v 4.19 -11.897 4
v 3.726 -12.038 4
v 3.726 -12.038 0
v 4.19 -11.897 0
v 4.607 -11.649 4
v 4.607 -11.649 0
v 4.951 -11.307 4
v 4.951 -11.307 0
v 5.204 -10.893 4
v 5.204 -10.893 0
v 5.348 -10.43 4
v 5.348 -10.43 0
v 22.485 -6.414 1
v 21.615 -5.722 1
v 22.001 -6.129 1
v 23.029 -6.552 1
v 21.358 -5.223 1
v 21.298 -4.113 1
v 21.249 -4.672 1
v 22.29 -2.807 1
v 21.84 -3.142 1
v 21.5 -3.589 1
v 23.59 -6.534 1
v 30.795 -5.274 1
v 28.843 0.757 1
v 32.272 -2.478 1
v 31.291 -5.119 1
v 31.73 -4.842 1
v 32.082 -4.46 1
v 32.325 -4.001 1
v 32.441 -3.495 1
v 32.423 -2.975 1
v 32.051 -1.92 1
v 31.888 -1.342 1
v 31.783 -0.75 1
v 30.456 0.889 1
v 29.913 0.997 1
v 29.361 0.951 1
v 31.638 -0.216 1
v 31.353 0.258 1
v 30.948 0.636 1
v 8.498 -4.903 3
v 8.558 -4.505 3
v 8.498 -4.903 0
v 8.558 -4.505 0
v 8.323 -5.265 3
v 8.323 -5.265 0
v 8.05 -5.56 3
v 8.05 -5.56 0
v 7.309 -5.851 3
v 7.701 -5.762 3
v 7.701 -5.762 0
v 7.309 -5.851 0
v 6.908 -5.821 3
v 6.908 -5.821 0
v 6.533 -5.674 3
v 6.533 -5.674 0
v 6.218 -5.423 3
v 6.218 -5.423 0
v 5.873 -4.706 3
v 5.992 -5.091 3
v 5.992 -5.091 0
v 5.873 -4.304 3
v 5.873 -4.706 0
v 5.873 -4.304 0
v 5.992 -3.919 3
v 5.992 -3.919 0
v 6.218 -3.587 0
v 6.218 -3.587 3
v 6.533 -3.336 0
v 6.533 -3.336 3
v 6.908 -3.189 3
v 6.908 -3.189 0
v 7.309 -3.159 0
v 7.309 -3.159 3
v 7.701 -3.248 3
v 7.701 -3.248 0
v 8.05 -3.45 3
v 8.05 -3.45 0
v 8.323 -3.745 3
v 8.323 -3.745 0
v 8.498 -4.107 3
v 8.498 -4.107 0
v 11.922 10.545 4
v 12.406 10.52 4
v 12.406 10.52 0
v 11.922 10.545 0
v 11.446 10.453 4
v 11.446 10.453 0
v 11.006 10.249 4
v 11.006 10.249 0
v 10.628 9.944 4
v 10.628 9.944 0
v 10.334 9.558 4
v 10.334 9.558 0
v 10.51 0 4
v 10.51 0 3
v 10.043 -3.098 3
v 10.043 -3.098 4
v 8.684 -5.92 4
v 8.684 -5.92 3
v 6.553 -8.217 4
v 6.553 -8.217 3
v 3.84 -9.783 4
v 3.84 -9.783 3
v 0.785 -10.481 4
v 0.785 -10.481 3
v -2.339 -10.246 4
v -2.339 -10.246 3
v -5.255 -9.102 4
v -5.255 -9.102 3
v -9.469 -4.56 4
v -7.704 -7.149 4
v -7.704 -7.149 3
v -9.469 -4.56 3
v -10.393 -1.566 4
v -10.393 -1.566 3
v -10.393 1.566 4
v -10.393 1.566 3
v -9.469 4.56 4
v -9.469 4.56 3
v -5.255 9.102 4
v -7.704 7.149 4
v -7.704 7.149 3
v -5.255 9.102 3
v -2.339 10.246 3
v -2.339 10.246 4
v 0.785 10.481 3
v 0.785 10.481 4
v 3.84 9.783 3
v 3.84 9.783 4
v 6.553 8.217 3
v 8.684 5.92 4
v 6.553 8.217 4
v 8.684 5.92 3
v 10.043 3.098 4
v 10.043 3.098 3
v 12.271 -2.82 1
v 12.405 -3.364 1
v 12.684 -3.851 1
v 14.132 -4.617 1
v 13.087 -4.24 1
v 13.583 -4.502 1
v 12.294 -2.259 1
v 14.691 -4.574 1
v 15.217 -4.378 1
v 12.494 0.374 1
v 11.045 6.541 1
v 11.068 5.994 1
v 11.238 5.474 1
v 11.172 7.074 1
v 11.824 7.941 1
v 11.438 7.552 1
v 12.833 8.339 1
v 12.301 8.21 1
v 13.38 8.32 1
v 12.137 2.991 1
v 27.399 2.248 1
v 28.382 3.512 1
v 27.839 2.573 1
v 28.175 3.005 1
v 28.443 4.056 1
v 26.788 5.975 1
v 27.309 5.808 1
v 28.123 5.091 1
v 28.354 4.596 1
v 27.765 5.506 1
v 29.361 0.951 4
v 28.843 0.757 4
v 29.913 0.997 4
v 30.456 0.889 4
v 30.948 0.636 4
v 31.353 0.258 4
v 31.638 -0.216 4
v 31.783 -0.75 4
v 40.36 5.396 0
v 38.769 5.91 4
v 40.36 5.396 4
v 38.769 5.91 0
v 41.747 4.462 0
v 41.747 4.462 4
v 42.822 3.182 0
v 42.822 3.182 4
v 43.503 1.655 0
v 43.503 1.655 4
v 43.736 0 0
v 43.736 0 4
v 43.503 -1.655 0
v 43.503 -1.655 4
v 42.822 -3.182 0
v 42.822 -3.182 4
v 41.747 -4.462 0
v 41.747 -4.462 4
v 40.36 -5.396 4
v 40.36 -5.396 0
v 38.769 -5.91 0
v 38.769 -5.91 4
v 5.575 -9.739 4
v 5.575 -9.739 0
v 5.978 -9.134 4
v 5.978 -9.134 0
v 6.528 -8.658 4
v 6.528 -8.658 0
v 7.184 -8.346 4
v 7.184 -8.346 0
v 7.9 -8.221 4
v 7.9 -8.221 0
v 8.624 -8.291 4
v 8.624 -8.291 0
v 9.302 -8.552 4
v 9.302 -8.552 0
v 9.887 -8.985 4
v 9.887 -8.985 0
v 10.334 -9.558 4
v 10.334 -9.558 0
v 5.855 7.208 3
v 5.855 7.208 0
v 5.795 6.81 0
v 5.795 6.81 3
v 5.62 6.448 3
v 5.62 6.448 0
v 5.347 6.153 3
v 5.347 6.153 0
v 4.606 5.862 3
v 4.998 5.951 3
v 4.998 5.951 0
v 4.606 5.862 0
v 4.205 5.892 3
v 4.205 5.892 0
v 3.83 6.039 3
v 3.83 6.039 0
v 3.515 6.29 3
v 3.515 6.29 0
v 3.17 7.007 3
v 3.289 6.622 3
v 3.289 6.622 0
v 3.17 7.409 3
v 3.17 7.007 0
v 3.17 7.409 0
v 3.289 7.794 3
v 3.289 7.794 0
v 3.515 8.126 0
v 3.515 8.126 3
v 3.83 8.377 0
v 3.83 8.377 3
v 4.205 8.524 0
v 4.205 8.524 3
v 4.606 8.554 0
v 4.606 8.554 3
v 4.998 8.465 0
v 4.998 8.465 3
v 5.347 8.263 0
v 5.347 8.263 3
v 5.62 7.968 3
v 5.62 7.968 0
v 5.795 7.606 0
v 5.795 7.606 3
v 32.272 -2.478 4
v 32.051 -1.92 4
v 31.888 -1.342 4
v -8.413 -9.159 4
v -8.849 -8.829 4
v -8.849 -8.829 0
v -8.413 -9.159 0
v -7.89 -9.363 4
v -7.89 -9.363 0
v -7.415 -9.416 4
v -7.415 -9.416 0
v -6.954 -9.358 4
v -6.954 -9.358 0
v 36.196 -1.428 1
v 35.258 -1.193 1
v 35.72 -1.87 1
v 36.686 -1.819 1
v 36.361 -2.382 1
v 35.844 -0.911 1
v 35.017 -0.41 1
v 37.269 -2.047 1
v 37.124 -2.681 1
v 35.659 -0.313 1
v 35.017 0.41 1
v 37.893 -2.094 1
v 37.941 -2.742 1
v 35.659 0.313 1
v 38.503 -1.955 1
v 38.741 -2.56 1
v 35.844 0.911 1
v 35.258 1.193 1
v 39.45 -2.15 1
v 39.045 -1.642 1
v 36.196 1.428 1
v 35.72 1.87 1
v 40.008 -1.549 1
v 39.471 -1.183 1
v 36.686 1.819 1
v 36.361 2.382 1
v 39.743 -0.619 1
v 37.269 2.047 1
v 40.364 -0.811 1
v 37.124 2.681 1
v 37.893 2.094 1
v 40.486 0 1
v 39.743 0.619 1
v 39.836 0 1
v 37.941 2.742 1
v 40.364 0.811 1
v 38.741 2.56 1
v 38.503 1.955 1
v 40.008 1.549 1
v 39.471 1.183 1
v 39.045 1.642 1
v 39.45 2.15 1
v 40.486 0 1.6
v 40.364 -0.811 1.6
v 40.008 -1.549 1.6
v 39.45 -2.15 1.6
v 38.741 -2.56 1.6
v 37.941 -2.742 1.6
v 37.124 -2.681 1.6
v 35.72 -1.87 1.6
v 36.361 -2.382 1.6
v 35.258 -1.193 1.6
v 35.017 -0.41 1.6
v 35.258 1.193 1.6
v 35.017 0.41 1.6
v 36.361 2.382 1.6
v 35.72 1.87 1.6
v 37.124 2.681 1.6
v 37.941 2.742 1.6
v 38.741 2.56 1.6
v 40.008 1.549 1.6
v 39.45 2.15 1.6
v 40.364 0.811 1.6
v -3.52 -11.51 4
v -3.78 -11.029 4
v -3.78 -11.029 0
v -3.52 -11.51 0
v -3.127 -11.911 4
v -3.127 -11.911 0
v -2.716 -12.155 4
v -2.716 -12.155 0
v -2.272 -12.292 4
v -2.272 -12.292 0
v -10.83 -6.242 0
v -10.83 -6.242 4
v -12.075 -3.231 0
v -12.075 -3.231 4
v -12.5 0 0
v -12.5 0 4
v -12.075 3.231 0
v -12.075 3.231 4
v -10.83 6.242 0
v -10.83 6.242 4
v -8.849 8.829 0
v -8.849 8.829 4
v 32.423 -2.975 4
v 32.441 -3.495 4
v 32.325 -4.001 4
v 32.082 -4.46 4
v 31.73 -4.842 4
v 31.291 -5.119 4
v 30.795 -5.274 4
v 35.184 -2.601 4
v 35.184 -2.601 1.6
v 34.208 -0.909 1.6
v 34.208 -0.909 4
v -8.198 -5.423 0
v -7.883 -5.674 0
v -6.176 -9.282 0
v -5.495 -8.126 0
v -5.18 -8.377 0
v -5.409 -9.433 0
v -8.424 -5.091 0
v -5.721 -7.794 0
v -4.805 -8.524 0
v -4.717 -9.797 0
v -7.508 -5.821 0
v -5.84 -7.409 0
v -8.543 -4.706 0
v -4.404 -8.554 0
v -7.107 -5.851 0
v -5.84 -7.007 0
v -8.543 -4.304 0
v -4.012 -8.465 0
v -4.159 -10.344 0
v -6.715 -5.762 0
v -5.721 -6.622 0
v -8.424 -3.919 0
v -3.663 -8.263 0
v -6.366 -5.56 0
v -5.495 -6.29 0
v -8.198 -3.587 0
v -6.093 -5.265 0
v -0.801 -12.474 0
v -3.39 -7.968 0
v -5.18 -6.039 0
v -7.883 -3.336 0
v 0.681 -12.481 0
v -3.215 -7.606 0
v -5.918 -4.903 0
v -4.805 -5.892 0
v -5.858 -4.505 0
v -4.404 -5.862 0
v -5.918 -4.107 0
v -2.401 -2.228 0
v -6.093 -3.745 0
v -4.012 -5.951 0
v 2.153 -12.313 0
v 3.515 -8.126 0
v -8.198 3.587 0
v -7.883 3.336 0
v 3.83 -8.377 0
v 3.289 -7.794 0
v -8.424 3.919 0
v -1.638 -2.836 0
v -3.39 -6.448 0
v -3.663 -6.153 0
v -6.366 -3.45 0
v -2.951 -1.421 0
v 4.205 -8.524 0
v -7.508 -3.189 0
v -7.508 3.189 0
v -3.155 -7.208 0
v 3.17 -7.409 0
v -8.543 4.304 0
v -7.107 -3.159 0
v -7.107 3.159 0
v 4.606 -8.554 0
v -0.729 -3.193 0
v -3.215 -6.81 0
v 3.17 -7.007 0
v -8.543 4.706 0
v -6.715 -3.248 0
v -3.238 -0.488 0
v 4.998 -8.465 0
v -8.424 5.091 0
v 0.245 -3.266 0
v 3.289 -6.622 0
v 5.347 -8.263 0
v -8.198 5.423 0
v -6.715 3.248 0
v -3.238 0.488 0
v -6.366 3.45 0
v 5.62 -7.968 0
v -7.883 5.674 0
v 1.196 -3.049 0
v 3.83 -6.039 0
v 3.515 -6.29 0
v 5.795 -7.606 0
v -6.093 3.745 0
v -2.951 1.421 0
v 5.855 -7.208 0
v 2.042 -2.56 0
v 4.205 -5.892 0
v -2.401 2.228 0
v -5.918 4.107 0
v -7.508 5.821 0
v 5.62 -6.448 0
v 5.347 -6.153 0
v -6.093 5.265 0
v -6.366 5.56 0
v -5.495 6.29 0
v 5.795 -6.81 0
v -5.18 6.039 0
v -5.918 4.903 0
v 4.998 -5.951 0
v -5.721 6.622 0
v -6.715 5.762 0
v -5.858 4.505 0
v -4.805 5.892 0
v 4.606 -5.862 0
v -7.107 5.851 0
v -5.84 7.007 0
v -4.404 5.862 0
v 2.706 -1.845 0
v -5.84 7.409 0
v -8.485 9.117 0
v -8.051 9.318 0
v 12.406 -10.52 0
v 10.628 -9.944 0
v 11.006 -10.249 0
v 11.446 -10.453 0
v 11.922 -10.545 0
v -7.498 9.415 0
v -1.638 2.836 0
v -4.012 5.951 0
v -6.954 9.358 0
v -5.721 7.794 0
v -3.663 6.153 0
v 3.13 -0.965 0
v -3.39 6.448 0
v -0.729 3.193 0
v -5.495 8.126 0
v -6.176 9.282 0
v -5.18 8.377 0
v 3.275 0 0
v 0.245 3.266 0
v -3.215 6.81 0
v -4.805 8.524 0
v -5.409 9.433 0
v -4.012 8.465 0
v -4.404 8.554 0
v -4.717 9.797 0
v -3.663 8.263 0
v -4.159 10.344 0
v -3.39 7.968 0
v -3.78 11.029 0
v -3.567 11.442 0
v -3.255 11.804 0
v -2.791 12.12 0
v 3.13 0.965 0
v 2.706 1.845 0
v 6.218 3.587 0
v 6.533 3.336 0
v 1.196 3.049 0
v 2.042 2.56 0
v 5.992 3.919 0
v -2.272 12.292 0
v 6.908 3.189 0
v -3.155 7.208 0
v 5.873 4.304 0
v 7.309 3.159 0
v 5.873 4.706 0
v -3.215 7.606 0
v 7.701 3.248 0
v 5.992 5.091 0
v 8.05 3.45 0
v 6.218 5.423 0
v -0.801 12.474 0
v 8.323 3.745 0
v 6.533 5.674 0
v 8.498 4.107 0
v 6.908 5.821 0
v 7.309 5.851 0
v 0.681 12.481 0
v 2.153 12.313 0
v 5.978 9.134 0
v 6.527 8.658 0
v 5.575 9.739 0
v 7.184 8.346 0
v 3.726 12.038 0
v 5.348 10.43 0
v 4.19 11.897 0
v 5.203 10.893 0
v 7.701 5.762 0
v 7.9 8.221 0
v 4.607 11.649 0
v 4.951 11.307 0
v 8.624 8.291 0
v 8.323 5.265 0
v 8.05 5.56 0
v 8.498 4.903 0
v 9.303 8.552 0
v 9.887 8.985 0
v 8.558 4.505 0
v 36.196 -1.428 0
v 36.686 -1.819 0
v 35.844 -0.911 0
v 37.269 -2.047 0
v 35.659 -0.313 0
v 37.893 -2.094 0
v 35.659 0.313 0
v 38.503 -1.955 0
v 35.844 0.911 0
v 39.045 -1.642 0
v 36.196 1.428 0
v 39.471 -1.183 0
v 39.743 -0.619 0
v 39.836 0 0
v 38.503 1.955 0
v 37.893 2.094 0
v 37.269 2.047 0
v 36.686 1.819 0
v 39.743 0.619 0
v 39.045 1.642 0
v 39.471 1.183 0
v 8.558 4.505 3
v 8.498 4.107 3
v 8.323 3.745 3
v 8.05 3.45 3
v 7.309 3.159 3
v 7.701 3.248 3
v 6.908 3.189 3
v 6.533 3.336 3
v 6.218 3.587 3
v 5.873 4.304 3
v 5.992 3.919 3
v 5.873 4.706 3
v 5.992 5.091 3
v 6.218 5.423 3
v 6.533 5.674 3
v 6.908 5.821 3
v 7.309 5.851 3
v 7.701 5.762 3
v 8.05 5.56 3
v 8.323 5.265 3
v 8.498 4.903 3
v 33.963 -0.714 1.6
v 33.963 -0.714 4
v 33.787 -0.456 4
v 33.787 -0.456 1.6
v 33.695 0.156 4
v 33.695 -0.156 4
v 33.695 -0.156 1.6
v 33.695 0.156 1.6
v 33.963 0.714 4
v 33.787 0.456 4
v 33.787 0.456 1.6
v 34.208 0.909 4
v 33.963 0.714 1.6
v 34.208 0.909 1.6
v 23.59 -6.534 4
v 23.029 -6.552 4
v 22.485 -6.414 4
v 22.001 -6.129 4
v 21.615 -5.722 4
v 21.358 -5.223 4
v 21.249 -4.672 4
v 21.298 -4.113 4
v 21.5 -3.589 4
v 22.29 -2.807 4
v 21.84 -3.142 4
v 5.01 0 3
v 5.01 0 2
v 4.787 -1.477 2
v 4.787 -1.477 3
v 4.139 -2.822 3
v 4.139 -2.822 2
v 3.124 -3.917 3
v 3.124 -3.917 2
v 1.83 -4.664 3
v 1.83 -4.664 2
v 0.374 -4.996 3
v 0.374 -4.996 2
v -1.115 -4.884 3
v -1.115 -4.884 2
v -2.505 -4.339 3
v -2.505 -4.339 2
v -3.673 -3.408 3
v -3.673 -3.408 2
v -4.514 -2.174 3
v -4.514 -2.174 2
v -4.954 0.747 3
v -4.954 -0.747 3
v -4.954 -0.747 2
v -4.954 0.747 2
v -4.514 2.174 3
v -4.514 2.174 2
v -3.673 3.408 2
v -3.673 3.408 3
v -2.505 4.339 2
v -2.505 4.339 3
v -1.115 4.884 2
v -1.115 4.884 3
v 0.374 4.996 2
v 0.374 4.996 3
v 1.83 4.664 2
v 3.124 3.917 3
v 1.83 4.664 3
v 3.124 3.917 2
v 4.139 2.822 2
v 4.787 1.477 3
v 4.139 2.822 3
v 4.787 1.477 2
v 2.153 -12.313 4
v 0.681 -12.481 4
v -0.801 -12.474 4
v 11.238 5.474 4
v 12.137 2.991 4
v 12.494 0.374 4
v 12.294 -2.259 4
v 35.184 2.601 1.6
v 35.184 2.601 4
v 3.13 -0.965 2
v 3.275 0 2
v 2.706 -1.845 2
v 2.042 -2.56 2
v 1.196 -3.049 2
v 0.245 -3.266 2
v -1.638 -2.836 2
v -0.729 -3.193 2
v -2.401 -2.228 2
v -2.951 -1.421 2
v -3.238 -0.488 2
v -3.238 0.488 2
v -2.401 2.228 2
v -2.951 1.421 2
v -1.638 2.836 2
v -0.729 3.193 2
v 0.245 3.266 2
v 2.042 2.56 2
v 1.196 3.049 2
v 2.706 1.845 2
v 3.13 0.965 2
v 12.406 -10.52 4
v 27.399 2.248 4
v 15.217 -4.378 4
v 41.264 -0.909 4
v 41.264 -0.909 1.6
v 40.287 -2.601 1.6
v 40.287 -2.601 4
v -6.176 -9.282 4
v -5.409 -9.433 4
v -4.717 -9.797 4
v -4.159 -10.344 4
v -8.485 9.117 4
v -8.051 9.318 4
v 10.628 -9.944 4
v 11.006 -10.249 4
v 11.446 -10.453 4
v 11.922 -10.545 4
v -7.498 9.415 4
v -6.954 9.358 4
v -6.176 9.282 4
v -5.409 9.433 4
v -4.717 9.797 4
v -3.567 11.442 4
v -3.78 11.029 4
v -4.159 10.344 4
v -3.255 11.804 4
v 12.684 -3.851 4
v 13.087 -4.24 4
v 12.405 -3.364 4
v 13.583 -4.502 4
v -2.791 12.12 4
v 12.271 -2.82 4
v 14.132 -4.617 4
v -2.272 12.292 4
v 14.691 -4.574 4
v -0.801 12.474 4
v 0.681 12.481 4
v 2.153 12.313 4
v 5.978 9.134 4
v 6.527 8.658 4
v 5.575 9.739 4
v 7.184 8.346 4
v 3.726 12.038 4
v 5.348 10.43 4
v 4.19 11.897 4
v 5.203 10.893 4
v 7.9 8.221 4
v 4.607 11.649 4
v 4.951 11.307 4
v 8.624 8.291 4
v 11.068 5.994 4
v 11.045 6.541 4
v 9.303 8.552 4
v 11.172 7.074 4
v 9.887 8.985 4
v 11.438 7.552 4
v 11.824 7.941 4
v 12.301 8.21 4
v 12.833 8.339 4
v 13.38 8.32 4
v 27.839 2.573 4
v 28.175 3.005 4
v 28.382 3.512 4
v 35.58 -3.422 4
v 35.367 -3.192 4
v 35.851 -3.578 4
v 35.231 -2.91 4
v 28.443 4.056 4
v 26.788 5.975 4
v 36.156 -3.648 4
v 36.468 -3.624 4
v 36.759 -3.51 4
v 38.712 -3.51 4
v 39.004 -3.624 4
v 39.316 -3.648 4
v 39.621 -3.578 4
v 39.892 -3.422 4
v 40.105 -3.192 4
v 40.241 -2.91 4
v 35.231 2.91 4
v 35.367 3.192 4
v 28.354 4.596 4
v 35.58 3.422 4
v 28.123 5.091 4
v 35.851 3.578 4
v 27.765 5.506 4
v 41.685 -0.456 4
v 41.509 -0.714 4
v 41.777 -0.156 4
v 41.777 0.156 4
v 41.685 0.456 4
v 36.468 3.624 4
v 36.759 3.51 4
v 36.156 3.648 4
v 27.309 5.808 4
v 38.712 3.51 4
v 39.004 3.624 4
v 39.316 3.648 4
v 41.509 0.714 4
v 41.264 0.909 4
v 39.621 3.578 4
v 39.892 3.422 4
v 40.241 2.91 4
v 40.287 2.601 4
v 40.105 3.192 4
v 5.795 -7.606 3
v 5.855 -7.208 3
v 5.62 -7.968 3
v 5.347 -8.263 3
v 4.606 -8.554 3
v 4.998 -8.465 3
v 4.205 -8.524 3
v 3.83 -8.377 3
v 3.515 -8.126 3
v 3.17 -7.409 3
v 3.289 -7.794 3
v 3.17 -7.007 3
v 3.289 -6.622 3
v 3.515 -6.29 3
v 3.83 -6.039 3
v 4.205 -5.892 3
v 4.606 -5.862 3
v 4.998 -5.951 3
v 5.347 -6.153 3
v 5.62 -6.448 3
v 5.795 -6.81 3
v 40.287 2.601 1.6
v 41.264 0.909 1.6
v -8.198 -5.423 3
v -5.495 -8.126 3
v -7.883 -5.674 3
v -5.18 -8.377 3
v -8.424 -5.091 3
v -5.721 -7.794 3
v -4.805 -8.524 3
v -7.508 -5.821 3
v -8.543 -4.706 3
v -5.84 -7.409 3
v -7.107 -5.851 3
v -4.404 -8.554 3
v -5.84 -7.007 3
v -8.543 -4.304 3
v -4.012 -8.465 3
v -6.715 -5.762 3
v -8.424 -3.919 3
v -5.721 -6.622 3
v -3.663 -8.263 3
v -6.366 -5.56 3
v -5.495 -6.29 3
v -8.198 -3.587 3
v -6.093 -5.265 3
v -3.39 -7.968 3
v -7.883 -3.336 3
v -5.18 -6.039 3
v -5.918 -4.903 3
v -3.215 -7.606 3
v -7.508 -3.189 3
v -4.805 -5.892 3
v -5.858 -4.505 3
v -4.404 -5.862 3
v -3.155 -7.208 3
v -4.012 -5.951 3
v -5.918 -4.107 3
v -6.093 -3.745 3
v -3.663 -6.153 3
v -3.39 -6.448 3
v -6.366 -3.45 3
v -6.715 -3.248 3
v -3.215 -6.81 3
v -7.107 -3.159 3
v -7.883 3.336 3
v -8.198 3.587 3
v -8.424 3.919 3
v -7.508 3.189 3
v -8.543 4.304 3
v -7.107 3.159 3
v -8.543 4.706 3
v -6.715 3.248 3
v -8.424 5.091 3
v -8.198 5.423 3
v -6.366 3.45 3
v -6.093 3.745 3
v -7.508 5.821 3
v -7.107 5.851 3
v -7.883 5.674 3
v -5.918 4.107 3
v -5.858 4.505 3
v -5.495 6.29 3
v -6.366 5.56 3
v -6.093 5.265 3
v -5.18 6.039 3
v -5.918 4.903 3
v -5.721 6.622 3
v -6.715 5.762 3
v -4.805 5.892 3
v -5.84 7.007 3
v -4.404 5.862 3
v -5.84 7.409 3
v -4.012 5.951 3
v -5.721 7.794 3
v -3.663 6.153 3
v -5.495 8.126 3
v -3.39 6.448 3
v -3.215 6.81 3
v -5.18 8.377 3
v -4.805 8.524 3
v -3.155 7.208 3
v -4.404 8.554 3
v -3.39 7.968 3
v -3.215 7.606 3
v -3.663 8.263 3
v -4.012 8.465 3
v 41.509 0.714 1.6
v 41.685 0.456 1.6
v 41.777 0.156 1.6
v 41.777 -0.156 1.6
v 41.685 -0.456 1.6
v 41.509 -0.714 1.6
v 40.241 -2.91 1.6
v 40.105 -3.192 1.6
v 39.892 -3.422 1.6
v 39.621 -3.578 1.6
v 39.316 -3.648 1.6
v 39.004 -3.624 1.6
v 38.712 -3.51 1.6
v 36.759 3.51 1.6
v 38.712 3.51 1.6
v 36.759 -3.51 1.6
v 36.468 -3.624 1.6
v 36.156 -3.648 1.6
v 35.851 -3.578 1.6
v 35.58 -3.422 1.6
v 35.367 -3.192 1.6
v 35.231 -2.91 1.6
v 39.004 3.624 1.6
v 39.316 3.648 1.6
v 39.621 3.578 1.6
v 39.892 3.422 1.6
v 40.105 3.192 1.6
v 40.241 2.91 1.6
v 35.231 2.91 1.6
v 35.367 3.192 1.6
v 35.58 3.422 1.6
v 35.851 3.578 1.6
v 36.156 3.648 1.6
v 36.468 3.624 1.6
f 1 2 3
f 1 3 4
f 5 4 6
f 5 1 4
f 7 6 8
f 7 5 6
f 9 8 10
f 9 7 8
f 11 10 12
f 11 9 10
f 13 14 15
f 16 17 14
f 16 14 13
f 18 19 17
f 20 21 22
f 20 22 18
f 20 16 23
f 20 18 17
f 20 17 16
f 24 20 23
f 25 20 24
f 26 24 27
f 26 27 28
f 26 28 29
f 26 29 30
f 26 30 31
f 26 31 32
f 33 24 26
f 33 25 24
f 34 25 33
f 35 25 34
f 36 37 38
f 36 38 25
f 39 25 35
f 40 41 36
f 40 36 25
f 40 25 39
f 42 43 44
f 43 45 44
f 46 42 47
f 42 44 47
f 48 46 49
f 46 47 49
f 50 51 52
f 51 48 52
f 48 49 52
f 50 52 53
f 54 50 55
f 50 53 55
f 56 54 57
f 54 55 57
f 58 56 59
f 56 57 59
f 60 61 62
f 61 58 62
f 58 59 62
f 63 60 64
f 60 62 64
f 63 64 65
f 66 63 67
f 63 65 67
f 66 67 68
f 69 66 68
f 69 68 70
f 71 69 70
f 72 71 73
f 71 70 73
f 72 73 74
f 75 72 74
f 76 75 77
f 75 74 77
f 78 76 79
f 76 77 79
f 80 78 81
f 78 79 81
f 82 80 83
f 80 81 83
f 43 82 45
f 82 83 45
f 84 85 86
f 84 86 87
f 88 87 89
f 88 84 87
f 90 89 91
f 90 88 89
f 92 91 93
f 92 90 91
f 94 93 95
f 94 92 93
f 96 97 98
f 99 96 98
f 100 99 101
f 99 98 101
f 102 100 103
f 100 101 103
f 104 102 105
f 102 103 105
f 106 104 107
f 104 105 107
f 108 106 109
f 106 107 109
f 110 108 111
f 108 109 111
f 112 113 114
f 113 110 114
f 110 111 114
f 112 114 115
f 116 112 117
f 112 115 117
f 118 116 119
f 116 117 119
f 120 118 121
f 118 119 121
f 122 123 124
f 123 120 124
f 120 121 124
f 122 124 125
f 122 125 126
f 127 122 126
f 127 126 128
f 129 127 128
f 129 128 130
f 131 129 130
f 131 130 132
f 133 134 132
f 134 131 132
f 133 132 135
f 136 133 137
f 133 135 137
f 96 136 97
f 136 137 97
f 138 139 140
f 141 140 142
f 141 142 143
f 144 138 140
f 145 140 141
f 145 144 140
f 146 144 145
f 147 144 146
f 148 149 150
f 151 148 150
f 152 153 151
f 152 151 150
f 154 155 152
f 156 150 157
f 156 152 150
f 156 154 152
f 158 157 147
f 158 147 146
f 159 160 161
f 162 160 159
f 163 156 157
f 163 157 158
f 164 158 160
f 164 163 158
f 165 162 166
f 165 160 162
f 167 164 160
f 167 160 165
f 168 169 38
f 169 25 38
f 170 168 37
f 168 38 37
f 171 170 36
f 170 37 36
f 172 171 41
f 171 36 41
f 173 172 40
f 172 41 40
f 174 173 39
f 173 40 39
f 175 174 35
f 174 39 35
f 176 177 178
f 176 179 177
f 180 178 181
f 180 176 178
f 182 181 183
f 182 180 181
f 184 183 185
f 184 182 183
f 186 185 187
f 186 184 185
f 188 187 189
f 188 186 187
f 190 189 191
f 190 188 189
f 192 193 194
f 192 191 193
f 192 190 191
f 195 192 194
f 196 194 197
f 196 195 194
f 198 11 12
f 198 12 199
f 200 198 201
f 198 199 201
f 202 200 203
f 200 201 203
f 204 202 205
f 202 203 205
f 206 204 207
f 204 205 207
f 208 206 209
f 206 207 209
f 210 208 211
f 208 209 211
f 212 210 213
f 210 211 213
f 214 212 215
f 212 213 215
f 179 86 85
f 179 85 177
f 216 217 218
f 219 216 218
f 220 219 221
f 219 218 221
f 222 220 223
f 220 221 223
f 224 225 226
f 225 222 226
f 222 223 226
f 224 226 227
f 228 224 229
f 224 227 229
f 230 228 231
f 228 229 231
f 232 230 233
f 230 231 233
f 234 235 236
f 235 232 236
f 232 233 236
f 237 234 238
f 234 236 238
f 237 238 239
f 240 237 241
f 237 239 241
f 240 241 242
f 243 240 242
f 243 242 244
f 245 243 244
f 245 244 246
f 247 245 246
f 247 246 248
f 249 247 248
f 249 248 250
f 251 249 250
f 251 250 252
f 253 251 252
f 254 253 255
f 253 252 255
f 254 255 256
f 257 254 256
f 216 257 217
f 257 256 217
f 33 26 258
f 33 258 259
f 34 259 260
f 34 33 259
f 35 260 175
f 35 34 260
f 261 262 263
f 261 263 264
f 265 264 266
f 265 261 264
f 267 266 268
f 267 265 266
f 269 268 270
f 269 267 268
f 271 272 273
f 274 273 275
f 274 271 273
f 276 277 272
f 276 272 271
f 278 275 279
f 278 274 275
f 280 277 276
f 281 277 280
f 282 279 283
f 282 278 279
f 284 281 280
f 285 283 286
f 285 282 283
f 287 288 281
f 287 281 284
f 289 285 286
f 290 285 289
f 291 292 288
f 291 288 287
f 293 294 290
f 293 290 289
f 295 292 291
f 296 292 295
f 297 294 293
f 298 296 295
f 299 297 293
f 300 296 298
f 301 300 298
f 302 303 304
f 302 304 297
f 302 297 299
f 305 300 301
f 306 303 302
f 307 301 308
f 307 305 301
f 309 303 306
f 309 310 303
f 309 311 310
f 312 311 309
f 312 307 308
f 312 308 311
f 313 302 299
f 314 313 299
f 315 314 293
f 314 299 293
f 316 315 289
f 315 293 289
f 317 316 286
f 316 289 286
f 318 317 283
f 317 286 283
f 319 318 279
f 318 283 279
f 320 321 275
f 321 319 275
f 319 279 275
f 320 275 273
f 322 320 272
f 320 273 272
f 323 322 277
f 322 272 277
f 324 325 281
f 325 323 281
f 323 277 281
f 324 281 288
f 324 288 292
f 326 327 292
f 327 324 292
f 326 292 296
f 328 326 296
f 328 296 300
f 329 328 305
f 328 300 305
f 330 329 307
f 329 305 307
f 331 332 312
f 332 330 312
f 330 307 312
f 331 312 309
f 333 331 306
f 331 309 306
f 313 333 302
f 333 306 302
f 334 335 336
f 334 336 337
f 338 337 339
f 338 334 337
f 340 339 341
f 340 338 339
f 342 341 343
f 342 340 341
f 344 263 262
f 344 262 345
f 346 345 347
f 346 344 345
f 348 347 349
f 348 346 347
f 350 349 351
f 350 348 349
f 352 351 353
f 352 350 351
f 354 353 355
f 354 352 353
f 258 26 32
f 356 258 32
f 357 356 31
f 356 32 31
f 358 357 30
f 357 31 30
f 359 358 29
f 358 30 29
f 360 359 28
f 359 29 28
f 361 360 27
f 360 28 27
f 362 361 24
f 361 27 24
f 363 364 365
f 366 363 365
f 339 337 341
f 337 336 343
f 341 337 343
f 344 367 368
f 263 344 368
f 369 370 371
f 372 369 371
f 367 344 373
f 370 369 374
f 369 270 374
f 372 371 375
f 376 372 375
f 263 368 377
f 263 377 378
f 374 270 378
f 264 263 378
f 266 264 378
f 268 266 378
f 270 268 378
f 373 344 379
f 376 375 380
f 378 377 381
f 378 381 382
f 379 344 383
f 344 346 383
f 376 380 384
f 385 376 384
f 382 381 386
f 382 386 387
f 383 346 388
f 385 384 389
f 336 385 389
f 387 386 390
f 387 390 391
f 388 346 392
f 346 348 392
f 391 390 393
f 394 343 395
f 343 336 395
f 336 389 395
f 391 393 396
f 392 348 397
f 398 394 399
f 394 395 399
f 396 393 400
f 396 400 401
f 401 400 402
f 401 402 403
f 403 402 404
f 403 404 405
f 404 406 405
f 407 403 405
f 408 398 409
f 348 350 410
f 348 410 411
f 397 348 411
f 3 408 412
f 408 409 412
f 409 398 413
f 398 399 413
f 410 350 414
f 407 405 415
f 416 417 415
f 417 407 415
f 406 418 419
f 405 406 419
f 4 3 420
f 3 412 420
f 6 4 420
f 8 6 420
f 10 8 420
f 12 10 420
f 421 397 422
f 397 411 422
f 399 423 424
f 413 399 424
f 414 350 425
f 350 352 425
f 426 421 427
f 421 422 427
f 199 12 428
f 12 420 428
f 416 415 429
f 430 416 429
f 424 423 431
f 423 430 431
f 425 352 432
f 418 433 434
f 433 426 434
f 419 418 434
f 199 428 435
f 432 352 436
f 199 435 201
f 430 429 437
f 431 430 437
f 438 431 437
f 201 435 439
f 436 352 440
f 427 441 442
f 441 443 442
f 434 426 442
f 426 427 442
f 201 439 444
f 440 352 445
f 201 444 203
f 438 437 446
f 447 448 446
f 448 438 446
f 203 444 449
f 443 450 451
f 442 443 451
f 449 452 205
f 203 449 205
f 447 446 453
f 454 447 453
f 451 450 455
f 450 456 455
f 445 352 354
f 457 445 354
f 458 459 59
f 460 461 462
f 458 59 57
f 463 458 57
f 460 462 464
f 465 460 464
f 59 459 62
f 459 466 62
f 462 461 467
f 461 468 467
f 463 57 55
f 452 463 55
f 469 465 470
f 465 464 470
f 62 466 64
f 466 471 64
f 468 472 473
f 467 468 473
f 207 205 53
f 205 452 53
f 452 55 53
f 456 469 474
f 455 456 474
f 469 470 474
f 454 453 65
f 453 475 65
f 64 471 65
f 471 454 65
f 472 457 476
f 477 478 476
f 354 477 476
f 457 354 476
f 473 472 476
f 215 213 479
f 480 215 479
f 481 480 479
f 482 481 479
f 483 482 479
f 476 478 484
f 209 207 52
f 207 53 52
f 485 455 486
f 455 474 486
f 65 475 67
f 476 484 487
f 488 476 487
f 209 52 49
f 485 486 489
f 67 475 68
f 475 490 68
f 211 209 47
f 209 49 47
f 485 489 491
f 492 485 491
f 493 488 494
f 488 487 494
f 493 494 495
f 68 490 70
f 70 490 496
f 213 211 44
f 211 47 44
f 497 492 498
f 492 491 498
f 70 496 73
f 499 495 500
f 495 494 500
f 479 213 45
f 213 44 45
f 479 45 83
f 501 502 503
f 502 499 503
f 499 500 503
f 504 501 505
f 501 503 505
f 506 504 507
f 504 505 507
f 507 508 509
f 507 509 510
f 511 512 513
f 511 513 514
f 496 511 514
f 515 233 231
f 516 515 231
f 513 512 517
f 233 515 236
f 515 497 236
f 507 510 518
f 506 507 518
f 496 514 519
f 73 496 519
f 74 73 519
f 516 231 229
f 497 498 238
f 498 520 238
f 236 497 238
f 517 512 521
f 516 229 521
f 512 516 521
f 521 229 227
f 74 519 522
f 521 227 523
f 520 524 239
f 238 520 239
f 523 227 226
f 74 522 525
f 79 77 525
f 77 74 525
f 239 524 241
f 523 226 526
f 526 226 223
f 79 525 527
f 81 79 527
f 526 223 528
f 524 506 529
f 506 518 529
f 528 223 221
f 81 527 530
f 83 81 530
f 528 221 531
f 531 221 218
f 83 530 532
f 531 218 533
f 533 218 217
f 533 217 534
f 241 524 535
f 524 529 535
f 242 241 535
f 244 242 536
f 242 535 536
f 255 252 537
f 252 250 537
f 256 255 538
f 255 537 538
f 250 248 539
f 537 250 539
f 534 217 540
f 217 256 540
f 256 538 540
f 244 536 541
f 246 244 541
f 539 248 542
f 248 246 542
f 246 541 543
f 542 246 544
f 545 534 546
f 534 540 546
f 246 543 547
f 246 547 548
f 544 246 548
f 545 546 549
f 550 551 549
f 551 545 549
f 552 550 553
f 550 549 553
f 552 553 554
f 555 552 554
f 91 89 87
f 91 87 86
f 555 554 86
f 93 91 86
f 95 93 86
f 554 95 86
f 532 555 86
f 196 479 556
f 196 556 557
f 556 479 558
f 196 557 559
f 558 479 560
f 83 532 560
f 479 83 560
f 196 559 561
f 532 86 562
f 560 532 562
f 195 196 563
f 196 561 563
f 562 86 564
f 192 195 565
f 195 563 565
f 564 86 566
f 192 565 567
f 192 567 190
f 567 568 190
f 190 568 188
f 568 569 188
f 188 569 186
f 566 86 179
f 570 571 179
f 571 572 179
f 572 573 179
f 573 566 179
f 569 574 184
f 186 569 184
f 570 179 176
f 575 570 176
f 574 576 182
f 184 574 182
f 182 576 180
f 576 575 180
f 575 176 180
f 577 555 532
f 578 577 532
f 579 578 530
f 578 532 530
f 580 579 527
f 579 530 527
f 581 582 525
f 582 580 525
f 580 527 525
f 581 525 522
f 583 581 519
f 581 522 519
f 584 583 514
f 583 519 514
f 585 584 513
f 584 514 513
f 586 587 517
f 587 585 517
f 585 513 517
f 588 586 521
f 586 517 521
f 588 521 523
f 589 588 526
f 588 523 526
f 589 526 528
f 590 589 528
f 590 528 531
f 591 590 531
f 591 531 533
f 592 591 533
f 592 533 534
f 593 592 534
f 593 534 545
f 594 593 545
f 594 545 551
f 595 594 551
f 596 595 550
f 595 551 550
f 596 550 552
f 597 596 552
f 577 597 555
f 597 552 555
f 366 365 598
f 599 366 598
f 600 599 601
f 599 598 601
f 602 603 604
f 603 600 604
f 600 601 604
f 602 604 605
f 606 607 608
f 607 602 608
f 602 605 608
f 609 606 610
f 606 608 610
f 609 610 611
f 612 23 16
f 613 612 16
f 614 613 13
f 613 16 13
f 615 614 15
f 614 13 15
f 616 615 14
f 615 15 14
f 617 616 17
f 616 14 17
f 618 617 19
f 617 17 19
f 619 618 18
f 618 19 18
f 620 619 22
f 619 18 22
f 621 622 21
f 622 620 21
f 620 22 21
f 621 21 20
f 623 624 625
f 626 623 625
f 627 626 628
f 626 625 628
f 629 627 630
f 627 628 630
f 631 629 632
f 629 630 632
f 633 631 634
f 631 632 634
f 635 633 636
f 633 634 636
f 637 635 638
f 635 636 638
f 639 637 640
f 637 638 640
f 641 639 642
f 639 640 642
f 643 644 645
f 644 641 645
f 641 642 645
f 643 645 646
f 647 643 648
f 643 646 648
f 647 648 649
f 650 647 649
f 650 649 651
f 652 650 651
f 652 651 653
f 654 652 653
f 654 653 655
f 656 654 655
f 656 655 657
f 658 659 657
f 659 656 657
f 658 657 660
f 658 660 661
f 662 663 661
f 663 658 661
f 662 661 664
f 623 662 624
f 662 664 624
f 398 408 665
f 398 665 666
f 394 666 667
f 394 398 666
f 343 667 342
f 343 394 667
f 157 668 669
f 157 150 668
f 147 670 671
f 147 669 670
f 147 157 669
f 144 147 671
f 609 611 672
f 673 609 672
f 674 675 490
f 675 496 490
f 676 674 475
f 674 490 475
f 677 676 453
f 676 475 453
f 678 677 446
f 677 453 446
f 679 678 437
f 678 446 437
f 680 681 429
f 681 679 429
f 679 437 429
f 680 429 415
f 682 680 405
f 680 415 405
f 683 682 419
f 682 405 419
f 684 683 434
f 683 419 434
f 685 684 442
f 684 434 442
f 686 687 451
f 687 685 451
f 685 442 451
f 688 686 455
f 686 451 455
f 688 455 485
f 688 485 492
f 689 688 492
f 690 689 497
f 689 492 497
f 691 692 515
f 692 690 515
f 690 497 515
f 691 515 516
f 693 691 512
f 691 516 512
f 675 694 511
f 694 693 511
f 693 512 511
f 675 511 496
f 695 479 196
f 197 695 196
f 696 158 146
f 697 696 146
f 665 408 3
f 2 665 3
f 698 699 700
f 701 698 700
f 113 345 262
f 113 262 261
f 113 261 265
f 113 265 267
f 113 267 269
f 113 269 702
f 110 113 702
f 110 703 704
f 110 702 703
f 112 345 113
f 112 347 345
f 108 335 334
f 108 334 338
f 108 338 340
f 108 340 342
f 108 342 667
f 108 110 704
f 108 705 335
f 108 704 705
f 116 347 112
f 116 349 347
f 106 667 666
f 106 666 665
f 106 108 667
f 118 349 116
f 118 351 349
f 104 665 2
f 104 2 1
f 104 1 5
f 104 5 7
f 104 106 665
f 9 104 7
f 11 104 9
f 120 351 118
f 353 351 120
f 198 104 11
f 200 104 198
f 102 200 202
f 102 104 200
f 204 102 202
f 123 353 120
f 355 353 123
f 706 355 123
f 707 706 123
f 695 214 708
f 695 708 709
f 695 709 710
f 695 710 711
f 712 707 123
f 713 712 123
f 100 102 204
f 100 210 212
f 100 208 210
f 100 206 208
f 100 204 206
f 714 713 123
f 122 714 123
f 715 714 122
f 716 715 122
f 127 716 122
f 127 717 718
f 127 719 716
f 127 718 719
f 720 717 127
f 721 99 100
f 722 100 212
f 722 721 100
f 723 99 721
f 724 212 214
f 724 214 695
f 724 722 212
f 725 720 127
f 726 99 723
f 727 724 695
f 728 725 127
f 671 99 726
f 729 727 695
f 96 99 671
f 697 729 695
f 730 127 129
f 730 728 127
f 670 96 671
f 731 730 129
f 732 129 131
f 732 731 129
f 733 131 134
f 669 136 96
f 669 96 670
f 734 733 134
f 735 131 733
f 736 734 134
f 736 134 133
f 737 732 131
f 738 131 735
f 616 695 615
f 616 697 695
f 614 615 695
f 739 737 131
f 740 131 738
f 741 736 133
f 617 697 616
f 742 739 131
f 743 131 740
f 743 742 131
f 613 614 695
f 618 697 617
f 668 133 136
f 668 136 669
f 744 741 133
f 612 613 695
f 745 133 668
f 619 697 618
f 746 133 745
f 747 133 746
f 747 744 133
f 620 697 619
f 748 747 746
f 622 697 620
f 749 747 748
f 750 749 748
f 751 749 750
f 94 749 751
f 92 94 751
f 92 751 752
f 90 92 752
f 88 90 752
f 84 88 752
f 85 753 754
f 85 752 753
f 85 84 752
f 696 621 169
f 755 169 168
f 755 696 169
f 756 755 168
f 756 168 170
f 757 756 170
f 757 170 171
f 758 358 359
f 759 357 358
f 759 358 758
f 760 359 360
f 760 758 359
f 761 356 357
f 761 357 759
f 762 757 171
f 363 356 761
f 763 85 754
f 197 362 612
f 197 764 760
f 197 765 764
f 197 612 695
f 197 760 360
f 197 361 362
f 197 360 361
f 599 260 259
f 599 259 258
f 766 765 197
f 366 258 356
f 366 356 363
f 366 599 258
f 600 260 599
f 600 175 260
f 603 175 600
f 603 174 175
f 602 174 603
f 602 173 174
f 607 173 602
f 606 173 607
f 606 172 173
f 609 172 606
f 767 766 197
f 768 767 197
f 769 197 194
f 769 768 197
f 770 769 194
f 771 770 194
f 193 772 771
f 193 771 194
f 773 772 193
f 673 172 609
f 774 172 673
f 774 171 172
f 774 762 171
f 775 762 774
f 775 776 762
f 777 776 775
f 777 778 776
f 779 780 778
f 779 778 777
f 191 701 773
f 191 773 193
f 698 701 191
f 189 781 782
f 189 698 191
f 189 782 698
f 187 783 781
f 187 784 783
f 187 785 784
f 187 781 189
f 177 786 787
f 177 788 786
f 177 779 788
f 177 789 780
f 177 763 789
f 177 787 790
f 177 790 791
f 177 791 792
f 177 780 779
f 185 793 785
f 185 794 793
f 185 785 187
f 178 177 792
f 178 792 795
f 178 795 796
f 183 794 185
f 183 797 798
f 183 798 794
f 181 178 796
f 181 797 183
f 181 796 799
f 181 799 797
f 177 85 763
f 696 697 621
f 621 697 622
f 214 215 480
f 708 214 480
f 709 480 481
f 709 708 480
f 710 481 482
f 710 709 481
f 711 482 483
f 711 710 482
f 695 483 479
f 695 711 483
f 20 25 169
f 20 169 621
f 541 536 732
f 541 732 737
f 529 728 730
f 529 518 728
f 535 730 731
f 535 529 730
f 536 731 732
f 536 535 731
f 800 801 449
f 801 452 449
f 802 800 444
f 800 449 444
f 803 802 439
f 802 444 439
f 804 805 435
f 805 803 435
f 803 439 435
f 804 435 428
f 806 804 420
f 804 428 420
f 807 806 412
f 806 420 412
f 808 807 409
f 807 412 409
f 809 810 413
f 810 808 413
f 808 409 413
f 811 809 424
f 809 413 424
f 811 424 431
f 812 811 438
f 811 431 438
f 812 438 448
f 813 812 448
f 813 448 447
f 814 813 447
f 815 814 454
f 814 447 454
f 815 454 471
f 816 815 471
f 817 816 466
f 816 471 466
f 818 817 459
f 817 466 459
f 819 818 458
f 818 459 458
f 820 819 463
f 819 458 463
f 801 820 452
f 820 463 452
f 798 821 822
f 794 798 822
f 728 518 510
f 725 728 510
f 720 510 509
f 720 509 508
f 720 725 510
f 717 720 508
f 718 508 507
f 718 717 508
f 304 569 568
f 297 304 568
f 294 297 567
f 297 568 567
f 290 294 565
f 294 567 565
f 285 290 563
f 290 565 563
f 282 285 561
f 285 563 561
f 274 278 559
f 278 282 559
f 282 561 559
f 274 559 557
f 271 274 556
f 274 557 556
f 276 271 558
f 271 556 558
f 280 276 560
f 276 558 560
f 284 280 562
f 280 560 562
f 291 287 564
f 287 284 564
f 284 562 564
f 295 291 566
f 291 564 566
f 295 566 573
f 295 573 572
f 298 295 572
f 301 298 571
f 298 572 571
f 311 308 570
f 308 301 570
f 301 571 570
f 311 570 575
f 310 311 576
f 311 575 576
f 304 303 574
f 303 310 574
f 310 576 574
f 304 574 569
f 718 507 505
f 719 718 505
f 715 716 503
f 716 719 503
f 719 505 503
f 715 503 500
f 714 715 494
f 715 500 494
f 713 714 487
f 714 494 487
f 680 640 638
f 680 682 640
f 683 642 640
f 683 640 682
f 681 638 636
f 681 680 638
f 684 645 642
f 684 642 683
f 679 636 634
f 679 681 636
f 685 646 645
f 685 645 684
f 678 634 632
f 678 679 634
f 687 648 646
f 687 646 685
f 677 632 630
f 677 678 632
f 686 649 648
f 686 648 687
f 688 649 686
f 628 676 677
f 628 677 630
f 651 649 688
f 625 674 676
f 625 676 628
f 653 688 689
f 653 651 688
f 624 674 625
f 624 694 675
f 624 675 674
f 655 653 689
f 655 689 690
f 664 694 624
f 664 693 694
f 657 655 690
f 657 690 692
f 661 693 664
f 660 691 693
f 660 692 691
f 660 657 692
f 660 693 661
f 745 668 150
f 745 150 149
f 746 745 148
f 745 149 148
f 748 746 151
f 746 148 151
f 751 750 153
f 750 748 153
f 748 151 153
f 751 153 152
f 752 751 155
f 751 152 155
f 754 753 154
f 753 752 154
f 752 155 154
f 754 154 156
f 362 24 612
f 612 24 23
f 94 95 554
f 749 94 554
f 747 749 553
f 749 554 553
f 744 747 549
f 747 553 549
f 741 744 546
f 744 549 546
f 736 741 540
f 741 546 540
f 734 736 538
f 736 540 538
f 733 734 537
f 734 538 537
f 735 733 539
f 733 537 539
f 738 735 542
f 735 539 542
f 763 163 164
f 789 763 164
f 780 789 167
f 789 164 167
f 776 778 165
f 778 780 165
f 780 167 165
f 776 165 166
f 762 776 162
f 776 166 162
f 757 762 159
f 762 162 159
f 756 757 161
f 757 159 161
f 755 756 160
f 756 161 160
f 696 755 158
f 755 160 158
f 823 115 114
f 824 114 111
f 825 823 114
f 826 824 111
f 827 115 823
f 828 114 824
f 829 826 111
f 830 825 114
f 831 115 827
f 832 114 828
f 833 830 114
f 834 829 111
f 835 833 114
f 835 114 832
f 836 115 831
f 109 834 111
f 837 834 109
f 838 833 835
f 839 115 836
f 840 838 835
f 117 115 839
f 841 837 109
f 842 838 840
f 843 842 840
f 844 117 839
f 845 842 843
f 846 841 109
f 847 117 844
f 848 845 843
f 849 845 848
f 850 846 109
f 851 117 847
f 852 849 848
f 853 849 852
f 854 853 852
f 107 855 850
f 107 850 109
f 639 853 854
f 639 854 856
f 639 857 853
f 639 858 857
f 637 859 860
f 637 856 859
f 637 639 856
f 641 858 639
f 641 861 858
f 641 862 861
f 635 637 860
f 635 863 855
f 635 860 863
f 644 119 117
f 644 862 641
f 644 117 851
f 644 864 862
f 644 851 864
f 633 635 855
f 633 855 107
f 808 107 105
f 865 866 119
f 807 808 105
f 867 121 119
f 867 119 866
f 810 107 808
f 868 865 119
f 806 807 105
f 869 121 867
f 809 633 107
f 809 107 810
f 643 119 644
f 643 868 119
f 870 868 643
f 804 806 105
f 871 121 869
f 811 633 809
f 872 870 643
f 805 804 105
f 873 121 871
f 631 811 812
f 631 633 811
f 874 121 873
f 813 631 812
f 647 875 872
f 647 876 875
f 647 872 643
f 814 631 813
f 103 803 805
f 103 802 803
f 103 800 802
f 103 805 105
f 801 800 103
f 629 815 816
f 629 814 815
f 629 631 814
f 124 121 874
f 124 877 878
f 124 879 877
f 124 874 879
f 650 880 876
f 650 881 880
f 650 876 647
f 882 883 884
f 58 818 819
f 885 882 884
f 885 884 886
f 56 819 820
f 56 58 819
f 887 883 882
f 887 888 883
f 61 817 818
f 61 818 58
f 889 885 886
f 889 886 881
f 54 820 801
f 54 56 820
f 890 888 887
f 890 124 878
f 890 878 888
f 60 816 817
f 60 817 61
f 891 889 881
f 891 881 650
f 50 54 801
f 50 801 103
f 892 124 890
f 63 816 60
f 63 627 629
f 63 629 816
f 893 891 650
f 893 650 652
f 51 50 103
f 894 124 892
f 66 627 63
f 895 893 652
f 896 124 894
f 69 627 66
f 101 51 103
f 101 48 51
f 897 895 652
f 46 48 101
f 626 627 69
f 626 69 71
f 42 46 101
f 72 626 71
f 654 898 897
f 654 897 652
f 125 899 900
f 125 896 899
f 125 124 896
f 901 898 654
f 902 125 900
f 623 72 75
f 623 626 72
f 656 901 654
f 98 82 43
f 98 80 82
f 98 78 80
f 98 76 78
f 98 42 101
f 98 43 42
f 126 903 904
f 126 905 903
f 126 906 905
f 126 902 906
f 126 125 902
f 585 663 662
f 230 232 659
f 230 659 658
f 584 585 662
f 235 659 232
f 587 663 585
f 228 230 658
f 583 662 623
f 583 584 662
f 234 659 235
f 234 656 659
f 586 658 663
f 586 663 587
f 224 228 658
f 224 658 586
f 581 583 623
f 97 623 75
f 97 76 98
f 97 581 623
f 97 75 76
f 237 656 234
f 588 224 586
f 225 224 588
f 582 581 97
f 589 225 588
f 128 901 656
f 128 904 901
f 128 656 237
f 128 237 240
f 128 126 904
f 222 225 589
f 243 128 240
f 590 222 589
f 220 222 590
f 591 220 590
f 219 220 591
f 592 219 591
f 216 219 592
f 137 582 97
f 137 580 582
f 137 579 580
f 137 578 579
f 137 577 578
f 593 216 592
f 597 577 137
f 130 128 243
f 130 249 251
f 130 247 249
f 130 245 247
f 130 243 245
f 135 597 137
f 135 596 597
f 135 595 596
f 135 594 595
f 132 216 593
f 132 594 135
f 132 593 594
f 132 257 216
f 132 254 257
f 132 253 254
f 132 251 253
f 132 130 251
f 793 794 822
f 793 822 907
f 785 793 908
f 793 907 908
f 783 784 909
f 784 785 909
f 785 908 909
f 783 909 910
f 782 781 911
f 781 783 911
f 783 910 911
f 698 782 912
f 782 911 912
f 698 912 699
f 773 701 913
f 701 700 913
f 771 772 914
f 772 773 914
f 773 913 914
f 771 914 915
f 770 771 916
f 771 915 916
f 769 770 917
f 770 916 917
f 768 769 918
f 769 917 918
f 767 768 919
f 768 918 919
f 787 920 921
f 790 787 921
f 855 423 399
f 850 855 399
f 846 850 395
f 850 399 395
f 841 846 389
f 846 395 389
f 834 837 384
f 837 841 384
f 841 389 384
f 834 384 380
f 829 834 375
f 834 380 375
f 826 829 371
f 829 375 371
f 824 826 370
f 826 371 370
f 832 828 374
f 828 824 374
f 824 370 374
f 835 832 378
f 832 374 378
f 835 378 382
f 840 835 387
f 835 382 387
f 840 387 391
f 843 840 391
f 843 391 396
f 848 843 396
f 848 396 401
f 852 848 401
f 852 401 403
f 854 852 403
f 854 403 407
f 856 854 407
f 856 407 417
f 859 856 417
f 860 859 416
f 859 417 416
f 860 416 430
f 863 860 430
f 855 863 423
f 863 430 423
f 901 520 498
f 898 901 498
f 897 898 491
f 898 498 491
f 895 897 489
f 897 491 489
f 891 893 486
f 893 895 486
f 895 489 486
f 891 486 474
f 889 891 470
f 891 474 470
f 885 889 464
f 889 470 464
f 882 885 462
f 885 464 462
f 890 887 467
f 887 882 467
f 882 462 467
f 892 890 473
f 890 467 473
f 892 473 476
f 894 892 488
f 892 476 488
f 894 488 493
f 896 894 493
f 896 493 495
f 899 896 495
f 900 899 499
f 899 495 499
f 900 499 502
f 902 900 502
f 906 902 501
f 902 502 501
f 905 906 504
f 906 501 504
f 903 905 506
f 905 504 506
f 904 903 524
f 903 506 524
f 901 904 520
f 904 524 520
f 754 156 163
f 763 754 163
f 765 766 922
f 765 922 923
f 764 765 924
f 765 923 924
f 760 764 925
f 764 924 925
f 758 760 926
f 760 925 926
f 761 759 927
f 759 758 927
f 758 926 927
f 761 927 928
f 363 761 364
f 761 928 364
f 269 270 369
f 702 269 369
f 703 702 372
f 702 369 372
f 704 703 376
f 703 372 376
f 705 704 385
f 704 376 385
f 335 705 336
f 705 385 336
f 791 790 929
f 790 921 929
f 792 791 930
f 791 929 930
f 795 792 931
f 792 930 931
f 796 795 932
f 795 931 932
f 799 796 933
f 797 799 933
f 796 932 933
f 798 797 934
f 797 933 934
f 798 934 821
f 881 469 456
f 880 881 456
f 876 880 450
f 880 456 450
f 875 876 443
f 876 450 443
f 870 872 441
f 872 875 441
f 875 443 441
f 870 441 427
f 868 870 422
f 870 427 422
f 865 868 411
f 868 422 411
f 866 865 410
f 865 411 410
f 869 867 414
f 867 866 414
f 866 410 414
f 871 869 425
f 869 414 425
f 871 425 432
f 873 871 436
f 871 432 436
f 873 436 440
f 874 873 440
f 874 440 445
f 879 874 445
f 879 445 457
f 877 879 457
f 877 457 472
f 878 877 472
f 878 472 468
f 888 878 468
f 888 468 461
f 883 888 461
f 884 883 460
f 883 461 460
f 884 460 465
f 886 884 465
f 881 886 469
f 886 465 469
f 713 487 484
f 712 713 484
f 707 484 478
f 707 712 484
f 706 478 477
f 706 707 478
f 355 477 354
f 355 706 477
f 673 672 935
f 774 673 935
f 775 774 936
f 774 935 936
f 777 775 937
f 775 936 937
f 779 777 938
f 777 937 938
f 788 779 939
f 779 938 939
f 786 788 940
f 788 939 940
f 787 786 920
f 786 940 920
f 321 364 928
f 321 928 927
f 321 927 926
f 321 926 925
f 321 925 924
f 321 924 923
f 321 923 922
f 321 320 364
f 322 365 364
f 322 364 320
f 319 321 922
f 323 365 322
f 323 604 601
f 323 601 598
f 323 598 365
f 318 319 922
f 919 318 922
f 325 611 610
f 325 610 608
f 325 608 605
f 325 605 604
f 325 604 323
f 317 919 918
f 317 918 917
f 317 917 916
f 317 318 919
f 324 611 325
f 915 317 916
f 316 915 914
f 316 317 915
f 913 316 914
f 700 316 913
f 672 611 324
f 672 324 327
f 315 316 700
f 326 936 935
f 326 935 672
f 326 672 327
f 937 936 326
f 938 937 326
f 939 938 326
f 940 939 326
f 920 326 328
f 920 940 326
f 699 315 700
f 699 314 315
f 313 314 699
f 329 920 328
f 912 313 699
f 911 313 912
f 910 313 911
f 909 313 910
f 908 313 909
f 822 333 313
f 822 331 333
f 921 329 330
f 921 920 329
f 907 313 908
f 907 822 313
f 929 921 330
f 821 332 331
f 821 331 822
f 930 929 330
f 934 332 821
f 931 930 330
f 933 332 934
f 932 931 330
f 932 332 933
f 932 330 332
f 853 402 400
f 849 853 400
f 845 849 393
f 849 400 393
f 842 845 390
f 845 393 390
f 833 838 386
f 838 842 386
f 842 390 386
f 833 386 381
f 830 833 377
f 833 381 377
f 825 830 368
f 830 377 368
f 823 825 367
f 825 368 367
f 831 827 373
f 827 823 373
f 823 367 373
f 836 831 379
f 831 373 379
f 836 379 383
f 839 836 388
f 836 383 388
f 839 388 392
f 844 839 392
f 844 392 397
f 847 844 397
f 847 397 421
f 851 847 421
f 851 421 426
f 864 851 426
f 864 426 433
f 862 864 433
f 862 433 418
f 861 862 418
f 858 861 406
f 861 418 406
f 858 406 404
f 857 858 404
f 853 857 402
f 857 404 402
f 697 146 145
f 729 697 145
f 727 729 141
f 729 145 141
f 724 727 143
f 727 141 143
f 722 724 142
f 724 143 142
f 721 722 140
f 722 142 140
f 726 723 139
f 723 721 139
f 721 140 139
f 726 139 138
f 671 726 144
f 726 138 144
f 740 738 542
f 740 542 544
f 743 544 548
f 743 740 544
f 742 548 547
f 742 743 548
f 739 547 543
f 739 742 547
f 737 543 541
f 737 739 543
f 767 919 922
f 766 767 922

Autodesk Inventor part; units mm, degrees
ref_plane "YZ Plane" through (0, 0, 0) normal (1, 0, 0) x (0, 1, 0)
ref_plane "XZ Plane" through (0, 0, 0) normal (0, 1, 0) x (-1, 0, 0)
ref_plane "XY Plane" through (0, 0, 0) normal (0, 0, 1) x (1, 0, 0)
sketch "スケッチ1" plane through (0, 0, 0) normal (0, 0, 1) x (1, 0, 0)
  circle A0 centre (0, 0) radius 10.5 construction
  circle A1 centre (0, 0) radius 5 construction
  circle A2 centre (0, 0) radius 5.01
  circle A3 centre (0, 0) radius 10.51
  arc A4 (2.1531, 12.3132) -> (2.1531, -12.3132) centre (0, 0) ccw
  circle A5 centre (37.7359, 0) radius 2.75
  arc A6 (38.7694, -5.9103) -> (38.7694, 5.9103) centre (37.7359, 0) ccw
  line L0 (2.1531, 12.3132) -> (38.7694, 5.9103)
  line L1 (2.1531, -12.3132) -> (38.7694, -5.9103)
  line L2 (13.3804, 8.3196) -> (26.7879, 5.9751)
  line L3 (30.7947, -5.2745) -> (23.5904, -6.5342)
  arc A7 (2.1531, -12.3132) -> (-4.7001, 11.5827) centre (0, 0) ccw construction
  arc A8 (38.7694, 5.9103) -> (32.2717, -2.4783) centre (37.7359, 0) ccw construction
  line L4 (34.0196, 4.7105) -> (8.4896, -9.1748) construction
  line L5 (27.399, 2.248) -> (15.2168, -4.3777)
  line L6 (28.8431, 0.7568) -> (22.2903, -2.8072)
  line L7 (32.4358, 4.9875) -> (34.0196, 4.7105) construction
  line L8 (11.5743, -8.6354) -> (8.4896, -9.1748) construction
  arc A9 (31.783, -0.7501) -> (32.2717, -2.4783) centre (37.7359, 0) ccw
  arc A10 (12.2941, -2.2592) -> (11.2378, 5.4737) centre (0, 0) ccw
  line L9 (41.7889, 0) -> (41.2639, -0.9093) construction
  line L10 (39.7624, -3.51) -> (38.7124, -3.51) construction
  line L11 (35.7094, -3.51) -> (35.1844, -2.6007) construction
  line L12 (33.6829, 0) -> (34.2079, 0.9093) construction
  line L13 (35.7094, 3.51) -> (36.7594, 3.51) construction
  line L14 (39.7624, 3.51) -> (40.2874, 2.6007)
  arc A11 (41.2639, -0.9093) -> (41.2639, 0.9093) centre (40.7389, 0) ccw
  arc A12 (40.2874, 2.6007) -> (38.7124, 3.51) centre (39.2374, 2.6007) ccw
  arc A13 (36.7594, 3.51) -> (35.1844, 2.6007) centre (36.2344, 2.6007) ccw
  arc A14 (34.2079, 0.9093) -> (34.2079, -0.9093) centre (34.7329, 0) ccw
  arc A15 (35.1844, -2.6007) -> (36.7594, -3.51) centre (36.2344, -2.6007) ccw
  arc A16 (38.7124, -3.51) -> (40.2874, -2.6007) centre (39.2374, -2.6007) ccw
  line L15 (41.2639, -0.9093) -> (40.2874, -2.6007)
  line L16 (40.2874, -2.6007) -> (39.7624, -3.51) construction
  line L17 (38.7124, -3.51) -> (36.7594, -3.51)
  line L18 (36.7594, -3.51) -> (35.7094, -3.51) construction
  line L19 (35.1844, -2.6007) -> (34.2079, -0.9093)
  line L20 (34.2079, -0.9093) -> (33.6829, 0) construction
  line L21 (35.1844, 2.6007) -> (35.7094, 3.51) construction
  line L22 (34.2079, 0.9093) -> (35.1844, 2.6007)
  line L23 (36.7594, 3.51) -> (38.7124, 3.51)
  line L24 (38.7124, 3.51) -> (39.7624, 3.51) construction
  line L25 (40.2874, 2.6007) -> (41.2639, 0.9093)
  line L26 (41.2639, 0.9093) -> (41.7889, 0) construction
  circle A17 centre (37.7359, 0) radius 2.1
  circle A18 centre (0, 0) radius 3.275
  line L27 (0, 0) -> (27.1359, -16.96) construction
  line L28 (37.7359, 0) -> (27.1359, -16.96) construction
  line L29 (0, 0) -> (37.7359, 0) construction
  line L30 (0, 0) -> (0.848, -0.53)
  line L31 (8.003, 10.918) -> (-6.307, -11.978) construction
  arc A19 (-3.608, -11.968) -> (-7.826, -9.747) centre (-6.307, -11.978) ccw
  arc A20 (5.4321, 11.7398) -> (10.7002, 10.8186) centre (8.003, 10.918) ccw
  arc A21 (13.3804, 8.3196) -> (11.2378, 5.4737) centre (13.0359, 6.3495) ccw
  arc A22 (12.2941, -2.2592) -> (15.2168, -4.3777) centre (14.2612, -2.6207) ccw
  arc A23 (22.2903, -2.8072) -> (23.5904, -6.5342) centre (23.2459, -4.5641) ccw
  arc A24 (30.7947, -5.2745) -> (32.2717, -2.4783) centre (30.4502, -3.3043) ccw
  arc A25 (31.783, -0.7501) -> (28.8431, 0.7568) centre (29.7987, -1.0002) ccw
  arc A26 (27.399, 2.248) -> (26.7879, 5.9751) centre (26.4434, 4.005) ccw
  line L32 (8.003, -10.918) -> (-6.307, 11.978) construction
  arc A27 (-7.826, 9.747) -> (-3.608, 11.968) centre (-6.307, 11.978) ccw
  arc A28 (10.7002, -10.8186) -> (5.4321, -11.7398) centre (8.003, -10.918) ccw
  line L33 (-6.625, -10.6) -> (6.625, 10.6) construction
  circle A29 centre (4.505, 7.208) radius 1.35
  circle A30 centre (-7.208, 4.505) radius 1.35
  circle A31 centre (-4.505, -7.208) radius 1.35
  circle A32 centre (7.208, -4.505) radius 1.35
  circle A33 centre (4.505, -7.208) radius 1.35
  circle A34 centre (-7.208, -4.505) radius 1.35
  circle A35 centre (-4.505, 7.208) radius 1.35
  circle A36 centre (7.208, 4.505) radius 1.35
  circle A37 centre (-4.505, -7.208) radius 2.4 construction
  point P0 (8.4896, 9.1748)
  point P1 (34.0196, -4.7105)
  point P2 (10.3333, -7.0337)
  point P3 (32.3635, 2.6714)
  point P4 (39.7624, 3.51)
  point P5 (9.5861, 8.9831)
  point P6 (9.0332, 8.6401)
  point P7 (-3.608, 11.968)
  dimension "d0" = 21
  dimension "d1" = 10
  dimension "d2" = 0.01
  dimension "d3" = 0.01
  dimension "d4" = 25
  dimension "d7" = 5.5
  dimension "d8" = 6
  dimension "d15" = 2
  dimension "d16" = 2
  dimension "d17" = 1
  dimension "d18" = 1
  dimension "d20" = 1.05
  dimension "d23" = 360
  dimension "d25" = 7.02
  dimension "d30" = 4.2
  dimension "d33" = 6.55
  dimension "d41" = 20
  dimension "d42" = 32
  dimension "d46" = 27
  dimension "d47" = 1
  dimension "d48" = 90
  dimension "d49" = 2.699
  dimension "d50" = 2.699
  dimension "d51" = 2
  dimension "d52" = 2
  dimension "d53" = 2
  dimension "d55" = 2.699
  dimension "d56" = 2.699
  dimension "d57" = 2.7
  dimension "d58" = 8.5
  dimension "d61" = 360
  dimension "d63" = 4.8
extrude "押し出し1" add sketch "スケッチ1" along normal blind 4 contours L0 A20 A6 L1 A28 A4 A19 A27
extrude "押し出し2" add sketch "スケッチ1" along normal blind 1.6 contours A12 L14 | L14 L25 A11 L15 A16 L17 A15 L19 A14 L22 A13 L23 A12
extrude "押し出し3" add sketch "スケッチ1" along normal blind 1 contours A5
extrude "押し出し4" add sketch "スケッチ1" along normal blind 3 contours A3
extrude "押し出し5" add sketch "スケッチ1" along normal blind 2 contours A2
extrude "押し出し6" add sketch "スケッチ1" along normal blind 1 contours L2 A26 L5 A22 A10 A21 | L3 A23 L6 A25 A9 A24
fillet "フィレット1" radius 2 8 edges at (-3.608, -11.968, 2) (-7.826, -9.747, 2) (10.7002, 10.8186, 2) (5.4321, 11.7398, 2) (5.4321, -11.7398, 2) (10.7002, -10.8186, 2) (-7.826, 9.747, 2) (-3.608, 11.968, 2)
equation "\"d3\" = d2"
equation "\"d18\" = d17"
equation "\"d50\" = d49"
properties part number "Ankle_side_pitch_frame" material "アルミニウム 2014-T4"
